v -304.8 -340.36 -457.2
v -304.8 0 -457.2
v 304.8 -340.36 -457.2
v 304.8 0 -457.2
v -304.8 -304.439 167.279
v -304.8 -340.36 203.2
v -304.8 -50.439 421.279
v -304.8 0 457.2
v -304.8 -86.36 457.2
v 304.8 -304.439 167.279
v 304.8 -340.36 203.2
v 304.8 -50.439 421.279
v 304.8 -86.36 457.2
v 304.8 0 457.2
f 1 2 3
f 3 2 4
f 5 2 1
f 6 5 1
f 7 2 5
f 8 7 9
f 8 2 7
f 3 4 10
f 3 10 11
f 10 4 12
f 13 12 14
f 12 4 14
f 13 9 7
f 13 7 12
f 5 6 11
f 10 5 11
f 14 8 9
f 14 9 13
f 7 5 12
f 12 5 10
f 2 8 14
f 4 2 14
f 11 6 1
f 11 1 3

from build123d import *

# Parameters (mm, degrees)
F0_W     = 609.6
F0_H     = 914.4
F1_DEPTH = 340.36
F2_SIZE  = 254
F3_DEPTH = 50.8


with BuildPart() as f1:
    # F0 (on Front) → F1 (new body)
    with BuildSketch(Plane.XZ):
        Rectangle(F0_W, F0_H)
    extrude(amount=F1_DEPTH)

    # F2
    f2_edges = [f1.edges().sort_by_distance(p)[0] for p in [
        (0, -340.36, 457.2),
    ]]
    chamfer(f2_edges, length=F2_SIZE)

    # F3 (cut): a face of the model
    f3_faces = [f1.faces().sort_by_distance(p)[0] for p in [
        (0, -213.36, 330.2),
    ]]
    extrude(f3_faces, amount=-F3_DEPTH, mode=Mode.SUBTRACT)


solid = f1.part
